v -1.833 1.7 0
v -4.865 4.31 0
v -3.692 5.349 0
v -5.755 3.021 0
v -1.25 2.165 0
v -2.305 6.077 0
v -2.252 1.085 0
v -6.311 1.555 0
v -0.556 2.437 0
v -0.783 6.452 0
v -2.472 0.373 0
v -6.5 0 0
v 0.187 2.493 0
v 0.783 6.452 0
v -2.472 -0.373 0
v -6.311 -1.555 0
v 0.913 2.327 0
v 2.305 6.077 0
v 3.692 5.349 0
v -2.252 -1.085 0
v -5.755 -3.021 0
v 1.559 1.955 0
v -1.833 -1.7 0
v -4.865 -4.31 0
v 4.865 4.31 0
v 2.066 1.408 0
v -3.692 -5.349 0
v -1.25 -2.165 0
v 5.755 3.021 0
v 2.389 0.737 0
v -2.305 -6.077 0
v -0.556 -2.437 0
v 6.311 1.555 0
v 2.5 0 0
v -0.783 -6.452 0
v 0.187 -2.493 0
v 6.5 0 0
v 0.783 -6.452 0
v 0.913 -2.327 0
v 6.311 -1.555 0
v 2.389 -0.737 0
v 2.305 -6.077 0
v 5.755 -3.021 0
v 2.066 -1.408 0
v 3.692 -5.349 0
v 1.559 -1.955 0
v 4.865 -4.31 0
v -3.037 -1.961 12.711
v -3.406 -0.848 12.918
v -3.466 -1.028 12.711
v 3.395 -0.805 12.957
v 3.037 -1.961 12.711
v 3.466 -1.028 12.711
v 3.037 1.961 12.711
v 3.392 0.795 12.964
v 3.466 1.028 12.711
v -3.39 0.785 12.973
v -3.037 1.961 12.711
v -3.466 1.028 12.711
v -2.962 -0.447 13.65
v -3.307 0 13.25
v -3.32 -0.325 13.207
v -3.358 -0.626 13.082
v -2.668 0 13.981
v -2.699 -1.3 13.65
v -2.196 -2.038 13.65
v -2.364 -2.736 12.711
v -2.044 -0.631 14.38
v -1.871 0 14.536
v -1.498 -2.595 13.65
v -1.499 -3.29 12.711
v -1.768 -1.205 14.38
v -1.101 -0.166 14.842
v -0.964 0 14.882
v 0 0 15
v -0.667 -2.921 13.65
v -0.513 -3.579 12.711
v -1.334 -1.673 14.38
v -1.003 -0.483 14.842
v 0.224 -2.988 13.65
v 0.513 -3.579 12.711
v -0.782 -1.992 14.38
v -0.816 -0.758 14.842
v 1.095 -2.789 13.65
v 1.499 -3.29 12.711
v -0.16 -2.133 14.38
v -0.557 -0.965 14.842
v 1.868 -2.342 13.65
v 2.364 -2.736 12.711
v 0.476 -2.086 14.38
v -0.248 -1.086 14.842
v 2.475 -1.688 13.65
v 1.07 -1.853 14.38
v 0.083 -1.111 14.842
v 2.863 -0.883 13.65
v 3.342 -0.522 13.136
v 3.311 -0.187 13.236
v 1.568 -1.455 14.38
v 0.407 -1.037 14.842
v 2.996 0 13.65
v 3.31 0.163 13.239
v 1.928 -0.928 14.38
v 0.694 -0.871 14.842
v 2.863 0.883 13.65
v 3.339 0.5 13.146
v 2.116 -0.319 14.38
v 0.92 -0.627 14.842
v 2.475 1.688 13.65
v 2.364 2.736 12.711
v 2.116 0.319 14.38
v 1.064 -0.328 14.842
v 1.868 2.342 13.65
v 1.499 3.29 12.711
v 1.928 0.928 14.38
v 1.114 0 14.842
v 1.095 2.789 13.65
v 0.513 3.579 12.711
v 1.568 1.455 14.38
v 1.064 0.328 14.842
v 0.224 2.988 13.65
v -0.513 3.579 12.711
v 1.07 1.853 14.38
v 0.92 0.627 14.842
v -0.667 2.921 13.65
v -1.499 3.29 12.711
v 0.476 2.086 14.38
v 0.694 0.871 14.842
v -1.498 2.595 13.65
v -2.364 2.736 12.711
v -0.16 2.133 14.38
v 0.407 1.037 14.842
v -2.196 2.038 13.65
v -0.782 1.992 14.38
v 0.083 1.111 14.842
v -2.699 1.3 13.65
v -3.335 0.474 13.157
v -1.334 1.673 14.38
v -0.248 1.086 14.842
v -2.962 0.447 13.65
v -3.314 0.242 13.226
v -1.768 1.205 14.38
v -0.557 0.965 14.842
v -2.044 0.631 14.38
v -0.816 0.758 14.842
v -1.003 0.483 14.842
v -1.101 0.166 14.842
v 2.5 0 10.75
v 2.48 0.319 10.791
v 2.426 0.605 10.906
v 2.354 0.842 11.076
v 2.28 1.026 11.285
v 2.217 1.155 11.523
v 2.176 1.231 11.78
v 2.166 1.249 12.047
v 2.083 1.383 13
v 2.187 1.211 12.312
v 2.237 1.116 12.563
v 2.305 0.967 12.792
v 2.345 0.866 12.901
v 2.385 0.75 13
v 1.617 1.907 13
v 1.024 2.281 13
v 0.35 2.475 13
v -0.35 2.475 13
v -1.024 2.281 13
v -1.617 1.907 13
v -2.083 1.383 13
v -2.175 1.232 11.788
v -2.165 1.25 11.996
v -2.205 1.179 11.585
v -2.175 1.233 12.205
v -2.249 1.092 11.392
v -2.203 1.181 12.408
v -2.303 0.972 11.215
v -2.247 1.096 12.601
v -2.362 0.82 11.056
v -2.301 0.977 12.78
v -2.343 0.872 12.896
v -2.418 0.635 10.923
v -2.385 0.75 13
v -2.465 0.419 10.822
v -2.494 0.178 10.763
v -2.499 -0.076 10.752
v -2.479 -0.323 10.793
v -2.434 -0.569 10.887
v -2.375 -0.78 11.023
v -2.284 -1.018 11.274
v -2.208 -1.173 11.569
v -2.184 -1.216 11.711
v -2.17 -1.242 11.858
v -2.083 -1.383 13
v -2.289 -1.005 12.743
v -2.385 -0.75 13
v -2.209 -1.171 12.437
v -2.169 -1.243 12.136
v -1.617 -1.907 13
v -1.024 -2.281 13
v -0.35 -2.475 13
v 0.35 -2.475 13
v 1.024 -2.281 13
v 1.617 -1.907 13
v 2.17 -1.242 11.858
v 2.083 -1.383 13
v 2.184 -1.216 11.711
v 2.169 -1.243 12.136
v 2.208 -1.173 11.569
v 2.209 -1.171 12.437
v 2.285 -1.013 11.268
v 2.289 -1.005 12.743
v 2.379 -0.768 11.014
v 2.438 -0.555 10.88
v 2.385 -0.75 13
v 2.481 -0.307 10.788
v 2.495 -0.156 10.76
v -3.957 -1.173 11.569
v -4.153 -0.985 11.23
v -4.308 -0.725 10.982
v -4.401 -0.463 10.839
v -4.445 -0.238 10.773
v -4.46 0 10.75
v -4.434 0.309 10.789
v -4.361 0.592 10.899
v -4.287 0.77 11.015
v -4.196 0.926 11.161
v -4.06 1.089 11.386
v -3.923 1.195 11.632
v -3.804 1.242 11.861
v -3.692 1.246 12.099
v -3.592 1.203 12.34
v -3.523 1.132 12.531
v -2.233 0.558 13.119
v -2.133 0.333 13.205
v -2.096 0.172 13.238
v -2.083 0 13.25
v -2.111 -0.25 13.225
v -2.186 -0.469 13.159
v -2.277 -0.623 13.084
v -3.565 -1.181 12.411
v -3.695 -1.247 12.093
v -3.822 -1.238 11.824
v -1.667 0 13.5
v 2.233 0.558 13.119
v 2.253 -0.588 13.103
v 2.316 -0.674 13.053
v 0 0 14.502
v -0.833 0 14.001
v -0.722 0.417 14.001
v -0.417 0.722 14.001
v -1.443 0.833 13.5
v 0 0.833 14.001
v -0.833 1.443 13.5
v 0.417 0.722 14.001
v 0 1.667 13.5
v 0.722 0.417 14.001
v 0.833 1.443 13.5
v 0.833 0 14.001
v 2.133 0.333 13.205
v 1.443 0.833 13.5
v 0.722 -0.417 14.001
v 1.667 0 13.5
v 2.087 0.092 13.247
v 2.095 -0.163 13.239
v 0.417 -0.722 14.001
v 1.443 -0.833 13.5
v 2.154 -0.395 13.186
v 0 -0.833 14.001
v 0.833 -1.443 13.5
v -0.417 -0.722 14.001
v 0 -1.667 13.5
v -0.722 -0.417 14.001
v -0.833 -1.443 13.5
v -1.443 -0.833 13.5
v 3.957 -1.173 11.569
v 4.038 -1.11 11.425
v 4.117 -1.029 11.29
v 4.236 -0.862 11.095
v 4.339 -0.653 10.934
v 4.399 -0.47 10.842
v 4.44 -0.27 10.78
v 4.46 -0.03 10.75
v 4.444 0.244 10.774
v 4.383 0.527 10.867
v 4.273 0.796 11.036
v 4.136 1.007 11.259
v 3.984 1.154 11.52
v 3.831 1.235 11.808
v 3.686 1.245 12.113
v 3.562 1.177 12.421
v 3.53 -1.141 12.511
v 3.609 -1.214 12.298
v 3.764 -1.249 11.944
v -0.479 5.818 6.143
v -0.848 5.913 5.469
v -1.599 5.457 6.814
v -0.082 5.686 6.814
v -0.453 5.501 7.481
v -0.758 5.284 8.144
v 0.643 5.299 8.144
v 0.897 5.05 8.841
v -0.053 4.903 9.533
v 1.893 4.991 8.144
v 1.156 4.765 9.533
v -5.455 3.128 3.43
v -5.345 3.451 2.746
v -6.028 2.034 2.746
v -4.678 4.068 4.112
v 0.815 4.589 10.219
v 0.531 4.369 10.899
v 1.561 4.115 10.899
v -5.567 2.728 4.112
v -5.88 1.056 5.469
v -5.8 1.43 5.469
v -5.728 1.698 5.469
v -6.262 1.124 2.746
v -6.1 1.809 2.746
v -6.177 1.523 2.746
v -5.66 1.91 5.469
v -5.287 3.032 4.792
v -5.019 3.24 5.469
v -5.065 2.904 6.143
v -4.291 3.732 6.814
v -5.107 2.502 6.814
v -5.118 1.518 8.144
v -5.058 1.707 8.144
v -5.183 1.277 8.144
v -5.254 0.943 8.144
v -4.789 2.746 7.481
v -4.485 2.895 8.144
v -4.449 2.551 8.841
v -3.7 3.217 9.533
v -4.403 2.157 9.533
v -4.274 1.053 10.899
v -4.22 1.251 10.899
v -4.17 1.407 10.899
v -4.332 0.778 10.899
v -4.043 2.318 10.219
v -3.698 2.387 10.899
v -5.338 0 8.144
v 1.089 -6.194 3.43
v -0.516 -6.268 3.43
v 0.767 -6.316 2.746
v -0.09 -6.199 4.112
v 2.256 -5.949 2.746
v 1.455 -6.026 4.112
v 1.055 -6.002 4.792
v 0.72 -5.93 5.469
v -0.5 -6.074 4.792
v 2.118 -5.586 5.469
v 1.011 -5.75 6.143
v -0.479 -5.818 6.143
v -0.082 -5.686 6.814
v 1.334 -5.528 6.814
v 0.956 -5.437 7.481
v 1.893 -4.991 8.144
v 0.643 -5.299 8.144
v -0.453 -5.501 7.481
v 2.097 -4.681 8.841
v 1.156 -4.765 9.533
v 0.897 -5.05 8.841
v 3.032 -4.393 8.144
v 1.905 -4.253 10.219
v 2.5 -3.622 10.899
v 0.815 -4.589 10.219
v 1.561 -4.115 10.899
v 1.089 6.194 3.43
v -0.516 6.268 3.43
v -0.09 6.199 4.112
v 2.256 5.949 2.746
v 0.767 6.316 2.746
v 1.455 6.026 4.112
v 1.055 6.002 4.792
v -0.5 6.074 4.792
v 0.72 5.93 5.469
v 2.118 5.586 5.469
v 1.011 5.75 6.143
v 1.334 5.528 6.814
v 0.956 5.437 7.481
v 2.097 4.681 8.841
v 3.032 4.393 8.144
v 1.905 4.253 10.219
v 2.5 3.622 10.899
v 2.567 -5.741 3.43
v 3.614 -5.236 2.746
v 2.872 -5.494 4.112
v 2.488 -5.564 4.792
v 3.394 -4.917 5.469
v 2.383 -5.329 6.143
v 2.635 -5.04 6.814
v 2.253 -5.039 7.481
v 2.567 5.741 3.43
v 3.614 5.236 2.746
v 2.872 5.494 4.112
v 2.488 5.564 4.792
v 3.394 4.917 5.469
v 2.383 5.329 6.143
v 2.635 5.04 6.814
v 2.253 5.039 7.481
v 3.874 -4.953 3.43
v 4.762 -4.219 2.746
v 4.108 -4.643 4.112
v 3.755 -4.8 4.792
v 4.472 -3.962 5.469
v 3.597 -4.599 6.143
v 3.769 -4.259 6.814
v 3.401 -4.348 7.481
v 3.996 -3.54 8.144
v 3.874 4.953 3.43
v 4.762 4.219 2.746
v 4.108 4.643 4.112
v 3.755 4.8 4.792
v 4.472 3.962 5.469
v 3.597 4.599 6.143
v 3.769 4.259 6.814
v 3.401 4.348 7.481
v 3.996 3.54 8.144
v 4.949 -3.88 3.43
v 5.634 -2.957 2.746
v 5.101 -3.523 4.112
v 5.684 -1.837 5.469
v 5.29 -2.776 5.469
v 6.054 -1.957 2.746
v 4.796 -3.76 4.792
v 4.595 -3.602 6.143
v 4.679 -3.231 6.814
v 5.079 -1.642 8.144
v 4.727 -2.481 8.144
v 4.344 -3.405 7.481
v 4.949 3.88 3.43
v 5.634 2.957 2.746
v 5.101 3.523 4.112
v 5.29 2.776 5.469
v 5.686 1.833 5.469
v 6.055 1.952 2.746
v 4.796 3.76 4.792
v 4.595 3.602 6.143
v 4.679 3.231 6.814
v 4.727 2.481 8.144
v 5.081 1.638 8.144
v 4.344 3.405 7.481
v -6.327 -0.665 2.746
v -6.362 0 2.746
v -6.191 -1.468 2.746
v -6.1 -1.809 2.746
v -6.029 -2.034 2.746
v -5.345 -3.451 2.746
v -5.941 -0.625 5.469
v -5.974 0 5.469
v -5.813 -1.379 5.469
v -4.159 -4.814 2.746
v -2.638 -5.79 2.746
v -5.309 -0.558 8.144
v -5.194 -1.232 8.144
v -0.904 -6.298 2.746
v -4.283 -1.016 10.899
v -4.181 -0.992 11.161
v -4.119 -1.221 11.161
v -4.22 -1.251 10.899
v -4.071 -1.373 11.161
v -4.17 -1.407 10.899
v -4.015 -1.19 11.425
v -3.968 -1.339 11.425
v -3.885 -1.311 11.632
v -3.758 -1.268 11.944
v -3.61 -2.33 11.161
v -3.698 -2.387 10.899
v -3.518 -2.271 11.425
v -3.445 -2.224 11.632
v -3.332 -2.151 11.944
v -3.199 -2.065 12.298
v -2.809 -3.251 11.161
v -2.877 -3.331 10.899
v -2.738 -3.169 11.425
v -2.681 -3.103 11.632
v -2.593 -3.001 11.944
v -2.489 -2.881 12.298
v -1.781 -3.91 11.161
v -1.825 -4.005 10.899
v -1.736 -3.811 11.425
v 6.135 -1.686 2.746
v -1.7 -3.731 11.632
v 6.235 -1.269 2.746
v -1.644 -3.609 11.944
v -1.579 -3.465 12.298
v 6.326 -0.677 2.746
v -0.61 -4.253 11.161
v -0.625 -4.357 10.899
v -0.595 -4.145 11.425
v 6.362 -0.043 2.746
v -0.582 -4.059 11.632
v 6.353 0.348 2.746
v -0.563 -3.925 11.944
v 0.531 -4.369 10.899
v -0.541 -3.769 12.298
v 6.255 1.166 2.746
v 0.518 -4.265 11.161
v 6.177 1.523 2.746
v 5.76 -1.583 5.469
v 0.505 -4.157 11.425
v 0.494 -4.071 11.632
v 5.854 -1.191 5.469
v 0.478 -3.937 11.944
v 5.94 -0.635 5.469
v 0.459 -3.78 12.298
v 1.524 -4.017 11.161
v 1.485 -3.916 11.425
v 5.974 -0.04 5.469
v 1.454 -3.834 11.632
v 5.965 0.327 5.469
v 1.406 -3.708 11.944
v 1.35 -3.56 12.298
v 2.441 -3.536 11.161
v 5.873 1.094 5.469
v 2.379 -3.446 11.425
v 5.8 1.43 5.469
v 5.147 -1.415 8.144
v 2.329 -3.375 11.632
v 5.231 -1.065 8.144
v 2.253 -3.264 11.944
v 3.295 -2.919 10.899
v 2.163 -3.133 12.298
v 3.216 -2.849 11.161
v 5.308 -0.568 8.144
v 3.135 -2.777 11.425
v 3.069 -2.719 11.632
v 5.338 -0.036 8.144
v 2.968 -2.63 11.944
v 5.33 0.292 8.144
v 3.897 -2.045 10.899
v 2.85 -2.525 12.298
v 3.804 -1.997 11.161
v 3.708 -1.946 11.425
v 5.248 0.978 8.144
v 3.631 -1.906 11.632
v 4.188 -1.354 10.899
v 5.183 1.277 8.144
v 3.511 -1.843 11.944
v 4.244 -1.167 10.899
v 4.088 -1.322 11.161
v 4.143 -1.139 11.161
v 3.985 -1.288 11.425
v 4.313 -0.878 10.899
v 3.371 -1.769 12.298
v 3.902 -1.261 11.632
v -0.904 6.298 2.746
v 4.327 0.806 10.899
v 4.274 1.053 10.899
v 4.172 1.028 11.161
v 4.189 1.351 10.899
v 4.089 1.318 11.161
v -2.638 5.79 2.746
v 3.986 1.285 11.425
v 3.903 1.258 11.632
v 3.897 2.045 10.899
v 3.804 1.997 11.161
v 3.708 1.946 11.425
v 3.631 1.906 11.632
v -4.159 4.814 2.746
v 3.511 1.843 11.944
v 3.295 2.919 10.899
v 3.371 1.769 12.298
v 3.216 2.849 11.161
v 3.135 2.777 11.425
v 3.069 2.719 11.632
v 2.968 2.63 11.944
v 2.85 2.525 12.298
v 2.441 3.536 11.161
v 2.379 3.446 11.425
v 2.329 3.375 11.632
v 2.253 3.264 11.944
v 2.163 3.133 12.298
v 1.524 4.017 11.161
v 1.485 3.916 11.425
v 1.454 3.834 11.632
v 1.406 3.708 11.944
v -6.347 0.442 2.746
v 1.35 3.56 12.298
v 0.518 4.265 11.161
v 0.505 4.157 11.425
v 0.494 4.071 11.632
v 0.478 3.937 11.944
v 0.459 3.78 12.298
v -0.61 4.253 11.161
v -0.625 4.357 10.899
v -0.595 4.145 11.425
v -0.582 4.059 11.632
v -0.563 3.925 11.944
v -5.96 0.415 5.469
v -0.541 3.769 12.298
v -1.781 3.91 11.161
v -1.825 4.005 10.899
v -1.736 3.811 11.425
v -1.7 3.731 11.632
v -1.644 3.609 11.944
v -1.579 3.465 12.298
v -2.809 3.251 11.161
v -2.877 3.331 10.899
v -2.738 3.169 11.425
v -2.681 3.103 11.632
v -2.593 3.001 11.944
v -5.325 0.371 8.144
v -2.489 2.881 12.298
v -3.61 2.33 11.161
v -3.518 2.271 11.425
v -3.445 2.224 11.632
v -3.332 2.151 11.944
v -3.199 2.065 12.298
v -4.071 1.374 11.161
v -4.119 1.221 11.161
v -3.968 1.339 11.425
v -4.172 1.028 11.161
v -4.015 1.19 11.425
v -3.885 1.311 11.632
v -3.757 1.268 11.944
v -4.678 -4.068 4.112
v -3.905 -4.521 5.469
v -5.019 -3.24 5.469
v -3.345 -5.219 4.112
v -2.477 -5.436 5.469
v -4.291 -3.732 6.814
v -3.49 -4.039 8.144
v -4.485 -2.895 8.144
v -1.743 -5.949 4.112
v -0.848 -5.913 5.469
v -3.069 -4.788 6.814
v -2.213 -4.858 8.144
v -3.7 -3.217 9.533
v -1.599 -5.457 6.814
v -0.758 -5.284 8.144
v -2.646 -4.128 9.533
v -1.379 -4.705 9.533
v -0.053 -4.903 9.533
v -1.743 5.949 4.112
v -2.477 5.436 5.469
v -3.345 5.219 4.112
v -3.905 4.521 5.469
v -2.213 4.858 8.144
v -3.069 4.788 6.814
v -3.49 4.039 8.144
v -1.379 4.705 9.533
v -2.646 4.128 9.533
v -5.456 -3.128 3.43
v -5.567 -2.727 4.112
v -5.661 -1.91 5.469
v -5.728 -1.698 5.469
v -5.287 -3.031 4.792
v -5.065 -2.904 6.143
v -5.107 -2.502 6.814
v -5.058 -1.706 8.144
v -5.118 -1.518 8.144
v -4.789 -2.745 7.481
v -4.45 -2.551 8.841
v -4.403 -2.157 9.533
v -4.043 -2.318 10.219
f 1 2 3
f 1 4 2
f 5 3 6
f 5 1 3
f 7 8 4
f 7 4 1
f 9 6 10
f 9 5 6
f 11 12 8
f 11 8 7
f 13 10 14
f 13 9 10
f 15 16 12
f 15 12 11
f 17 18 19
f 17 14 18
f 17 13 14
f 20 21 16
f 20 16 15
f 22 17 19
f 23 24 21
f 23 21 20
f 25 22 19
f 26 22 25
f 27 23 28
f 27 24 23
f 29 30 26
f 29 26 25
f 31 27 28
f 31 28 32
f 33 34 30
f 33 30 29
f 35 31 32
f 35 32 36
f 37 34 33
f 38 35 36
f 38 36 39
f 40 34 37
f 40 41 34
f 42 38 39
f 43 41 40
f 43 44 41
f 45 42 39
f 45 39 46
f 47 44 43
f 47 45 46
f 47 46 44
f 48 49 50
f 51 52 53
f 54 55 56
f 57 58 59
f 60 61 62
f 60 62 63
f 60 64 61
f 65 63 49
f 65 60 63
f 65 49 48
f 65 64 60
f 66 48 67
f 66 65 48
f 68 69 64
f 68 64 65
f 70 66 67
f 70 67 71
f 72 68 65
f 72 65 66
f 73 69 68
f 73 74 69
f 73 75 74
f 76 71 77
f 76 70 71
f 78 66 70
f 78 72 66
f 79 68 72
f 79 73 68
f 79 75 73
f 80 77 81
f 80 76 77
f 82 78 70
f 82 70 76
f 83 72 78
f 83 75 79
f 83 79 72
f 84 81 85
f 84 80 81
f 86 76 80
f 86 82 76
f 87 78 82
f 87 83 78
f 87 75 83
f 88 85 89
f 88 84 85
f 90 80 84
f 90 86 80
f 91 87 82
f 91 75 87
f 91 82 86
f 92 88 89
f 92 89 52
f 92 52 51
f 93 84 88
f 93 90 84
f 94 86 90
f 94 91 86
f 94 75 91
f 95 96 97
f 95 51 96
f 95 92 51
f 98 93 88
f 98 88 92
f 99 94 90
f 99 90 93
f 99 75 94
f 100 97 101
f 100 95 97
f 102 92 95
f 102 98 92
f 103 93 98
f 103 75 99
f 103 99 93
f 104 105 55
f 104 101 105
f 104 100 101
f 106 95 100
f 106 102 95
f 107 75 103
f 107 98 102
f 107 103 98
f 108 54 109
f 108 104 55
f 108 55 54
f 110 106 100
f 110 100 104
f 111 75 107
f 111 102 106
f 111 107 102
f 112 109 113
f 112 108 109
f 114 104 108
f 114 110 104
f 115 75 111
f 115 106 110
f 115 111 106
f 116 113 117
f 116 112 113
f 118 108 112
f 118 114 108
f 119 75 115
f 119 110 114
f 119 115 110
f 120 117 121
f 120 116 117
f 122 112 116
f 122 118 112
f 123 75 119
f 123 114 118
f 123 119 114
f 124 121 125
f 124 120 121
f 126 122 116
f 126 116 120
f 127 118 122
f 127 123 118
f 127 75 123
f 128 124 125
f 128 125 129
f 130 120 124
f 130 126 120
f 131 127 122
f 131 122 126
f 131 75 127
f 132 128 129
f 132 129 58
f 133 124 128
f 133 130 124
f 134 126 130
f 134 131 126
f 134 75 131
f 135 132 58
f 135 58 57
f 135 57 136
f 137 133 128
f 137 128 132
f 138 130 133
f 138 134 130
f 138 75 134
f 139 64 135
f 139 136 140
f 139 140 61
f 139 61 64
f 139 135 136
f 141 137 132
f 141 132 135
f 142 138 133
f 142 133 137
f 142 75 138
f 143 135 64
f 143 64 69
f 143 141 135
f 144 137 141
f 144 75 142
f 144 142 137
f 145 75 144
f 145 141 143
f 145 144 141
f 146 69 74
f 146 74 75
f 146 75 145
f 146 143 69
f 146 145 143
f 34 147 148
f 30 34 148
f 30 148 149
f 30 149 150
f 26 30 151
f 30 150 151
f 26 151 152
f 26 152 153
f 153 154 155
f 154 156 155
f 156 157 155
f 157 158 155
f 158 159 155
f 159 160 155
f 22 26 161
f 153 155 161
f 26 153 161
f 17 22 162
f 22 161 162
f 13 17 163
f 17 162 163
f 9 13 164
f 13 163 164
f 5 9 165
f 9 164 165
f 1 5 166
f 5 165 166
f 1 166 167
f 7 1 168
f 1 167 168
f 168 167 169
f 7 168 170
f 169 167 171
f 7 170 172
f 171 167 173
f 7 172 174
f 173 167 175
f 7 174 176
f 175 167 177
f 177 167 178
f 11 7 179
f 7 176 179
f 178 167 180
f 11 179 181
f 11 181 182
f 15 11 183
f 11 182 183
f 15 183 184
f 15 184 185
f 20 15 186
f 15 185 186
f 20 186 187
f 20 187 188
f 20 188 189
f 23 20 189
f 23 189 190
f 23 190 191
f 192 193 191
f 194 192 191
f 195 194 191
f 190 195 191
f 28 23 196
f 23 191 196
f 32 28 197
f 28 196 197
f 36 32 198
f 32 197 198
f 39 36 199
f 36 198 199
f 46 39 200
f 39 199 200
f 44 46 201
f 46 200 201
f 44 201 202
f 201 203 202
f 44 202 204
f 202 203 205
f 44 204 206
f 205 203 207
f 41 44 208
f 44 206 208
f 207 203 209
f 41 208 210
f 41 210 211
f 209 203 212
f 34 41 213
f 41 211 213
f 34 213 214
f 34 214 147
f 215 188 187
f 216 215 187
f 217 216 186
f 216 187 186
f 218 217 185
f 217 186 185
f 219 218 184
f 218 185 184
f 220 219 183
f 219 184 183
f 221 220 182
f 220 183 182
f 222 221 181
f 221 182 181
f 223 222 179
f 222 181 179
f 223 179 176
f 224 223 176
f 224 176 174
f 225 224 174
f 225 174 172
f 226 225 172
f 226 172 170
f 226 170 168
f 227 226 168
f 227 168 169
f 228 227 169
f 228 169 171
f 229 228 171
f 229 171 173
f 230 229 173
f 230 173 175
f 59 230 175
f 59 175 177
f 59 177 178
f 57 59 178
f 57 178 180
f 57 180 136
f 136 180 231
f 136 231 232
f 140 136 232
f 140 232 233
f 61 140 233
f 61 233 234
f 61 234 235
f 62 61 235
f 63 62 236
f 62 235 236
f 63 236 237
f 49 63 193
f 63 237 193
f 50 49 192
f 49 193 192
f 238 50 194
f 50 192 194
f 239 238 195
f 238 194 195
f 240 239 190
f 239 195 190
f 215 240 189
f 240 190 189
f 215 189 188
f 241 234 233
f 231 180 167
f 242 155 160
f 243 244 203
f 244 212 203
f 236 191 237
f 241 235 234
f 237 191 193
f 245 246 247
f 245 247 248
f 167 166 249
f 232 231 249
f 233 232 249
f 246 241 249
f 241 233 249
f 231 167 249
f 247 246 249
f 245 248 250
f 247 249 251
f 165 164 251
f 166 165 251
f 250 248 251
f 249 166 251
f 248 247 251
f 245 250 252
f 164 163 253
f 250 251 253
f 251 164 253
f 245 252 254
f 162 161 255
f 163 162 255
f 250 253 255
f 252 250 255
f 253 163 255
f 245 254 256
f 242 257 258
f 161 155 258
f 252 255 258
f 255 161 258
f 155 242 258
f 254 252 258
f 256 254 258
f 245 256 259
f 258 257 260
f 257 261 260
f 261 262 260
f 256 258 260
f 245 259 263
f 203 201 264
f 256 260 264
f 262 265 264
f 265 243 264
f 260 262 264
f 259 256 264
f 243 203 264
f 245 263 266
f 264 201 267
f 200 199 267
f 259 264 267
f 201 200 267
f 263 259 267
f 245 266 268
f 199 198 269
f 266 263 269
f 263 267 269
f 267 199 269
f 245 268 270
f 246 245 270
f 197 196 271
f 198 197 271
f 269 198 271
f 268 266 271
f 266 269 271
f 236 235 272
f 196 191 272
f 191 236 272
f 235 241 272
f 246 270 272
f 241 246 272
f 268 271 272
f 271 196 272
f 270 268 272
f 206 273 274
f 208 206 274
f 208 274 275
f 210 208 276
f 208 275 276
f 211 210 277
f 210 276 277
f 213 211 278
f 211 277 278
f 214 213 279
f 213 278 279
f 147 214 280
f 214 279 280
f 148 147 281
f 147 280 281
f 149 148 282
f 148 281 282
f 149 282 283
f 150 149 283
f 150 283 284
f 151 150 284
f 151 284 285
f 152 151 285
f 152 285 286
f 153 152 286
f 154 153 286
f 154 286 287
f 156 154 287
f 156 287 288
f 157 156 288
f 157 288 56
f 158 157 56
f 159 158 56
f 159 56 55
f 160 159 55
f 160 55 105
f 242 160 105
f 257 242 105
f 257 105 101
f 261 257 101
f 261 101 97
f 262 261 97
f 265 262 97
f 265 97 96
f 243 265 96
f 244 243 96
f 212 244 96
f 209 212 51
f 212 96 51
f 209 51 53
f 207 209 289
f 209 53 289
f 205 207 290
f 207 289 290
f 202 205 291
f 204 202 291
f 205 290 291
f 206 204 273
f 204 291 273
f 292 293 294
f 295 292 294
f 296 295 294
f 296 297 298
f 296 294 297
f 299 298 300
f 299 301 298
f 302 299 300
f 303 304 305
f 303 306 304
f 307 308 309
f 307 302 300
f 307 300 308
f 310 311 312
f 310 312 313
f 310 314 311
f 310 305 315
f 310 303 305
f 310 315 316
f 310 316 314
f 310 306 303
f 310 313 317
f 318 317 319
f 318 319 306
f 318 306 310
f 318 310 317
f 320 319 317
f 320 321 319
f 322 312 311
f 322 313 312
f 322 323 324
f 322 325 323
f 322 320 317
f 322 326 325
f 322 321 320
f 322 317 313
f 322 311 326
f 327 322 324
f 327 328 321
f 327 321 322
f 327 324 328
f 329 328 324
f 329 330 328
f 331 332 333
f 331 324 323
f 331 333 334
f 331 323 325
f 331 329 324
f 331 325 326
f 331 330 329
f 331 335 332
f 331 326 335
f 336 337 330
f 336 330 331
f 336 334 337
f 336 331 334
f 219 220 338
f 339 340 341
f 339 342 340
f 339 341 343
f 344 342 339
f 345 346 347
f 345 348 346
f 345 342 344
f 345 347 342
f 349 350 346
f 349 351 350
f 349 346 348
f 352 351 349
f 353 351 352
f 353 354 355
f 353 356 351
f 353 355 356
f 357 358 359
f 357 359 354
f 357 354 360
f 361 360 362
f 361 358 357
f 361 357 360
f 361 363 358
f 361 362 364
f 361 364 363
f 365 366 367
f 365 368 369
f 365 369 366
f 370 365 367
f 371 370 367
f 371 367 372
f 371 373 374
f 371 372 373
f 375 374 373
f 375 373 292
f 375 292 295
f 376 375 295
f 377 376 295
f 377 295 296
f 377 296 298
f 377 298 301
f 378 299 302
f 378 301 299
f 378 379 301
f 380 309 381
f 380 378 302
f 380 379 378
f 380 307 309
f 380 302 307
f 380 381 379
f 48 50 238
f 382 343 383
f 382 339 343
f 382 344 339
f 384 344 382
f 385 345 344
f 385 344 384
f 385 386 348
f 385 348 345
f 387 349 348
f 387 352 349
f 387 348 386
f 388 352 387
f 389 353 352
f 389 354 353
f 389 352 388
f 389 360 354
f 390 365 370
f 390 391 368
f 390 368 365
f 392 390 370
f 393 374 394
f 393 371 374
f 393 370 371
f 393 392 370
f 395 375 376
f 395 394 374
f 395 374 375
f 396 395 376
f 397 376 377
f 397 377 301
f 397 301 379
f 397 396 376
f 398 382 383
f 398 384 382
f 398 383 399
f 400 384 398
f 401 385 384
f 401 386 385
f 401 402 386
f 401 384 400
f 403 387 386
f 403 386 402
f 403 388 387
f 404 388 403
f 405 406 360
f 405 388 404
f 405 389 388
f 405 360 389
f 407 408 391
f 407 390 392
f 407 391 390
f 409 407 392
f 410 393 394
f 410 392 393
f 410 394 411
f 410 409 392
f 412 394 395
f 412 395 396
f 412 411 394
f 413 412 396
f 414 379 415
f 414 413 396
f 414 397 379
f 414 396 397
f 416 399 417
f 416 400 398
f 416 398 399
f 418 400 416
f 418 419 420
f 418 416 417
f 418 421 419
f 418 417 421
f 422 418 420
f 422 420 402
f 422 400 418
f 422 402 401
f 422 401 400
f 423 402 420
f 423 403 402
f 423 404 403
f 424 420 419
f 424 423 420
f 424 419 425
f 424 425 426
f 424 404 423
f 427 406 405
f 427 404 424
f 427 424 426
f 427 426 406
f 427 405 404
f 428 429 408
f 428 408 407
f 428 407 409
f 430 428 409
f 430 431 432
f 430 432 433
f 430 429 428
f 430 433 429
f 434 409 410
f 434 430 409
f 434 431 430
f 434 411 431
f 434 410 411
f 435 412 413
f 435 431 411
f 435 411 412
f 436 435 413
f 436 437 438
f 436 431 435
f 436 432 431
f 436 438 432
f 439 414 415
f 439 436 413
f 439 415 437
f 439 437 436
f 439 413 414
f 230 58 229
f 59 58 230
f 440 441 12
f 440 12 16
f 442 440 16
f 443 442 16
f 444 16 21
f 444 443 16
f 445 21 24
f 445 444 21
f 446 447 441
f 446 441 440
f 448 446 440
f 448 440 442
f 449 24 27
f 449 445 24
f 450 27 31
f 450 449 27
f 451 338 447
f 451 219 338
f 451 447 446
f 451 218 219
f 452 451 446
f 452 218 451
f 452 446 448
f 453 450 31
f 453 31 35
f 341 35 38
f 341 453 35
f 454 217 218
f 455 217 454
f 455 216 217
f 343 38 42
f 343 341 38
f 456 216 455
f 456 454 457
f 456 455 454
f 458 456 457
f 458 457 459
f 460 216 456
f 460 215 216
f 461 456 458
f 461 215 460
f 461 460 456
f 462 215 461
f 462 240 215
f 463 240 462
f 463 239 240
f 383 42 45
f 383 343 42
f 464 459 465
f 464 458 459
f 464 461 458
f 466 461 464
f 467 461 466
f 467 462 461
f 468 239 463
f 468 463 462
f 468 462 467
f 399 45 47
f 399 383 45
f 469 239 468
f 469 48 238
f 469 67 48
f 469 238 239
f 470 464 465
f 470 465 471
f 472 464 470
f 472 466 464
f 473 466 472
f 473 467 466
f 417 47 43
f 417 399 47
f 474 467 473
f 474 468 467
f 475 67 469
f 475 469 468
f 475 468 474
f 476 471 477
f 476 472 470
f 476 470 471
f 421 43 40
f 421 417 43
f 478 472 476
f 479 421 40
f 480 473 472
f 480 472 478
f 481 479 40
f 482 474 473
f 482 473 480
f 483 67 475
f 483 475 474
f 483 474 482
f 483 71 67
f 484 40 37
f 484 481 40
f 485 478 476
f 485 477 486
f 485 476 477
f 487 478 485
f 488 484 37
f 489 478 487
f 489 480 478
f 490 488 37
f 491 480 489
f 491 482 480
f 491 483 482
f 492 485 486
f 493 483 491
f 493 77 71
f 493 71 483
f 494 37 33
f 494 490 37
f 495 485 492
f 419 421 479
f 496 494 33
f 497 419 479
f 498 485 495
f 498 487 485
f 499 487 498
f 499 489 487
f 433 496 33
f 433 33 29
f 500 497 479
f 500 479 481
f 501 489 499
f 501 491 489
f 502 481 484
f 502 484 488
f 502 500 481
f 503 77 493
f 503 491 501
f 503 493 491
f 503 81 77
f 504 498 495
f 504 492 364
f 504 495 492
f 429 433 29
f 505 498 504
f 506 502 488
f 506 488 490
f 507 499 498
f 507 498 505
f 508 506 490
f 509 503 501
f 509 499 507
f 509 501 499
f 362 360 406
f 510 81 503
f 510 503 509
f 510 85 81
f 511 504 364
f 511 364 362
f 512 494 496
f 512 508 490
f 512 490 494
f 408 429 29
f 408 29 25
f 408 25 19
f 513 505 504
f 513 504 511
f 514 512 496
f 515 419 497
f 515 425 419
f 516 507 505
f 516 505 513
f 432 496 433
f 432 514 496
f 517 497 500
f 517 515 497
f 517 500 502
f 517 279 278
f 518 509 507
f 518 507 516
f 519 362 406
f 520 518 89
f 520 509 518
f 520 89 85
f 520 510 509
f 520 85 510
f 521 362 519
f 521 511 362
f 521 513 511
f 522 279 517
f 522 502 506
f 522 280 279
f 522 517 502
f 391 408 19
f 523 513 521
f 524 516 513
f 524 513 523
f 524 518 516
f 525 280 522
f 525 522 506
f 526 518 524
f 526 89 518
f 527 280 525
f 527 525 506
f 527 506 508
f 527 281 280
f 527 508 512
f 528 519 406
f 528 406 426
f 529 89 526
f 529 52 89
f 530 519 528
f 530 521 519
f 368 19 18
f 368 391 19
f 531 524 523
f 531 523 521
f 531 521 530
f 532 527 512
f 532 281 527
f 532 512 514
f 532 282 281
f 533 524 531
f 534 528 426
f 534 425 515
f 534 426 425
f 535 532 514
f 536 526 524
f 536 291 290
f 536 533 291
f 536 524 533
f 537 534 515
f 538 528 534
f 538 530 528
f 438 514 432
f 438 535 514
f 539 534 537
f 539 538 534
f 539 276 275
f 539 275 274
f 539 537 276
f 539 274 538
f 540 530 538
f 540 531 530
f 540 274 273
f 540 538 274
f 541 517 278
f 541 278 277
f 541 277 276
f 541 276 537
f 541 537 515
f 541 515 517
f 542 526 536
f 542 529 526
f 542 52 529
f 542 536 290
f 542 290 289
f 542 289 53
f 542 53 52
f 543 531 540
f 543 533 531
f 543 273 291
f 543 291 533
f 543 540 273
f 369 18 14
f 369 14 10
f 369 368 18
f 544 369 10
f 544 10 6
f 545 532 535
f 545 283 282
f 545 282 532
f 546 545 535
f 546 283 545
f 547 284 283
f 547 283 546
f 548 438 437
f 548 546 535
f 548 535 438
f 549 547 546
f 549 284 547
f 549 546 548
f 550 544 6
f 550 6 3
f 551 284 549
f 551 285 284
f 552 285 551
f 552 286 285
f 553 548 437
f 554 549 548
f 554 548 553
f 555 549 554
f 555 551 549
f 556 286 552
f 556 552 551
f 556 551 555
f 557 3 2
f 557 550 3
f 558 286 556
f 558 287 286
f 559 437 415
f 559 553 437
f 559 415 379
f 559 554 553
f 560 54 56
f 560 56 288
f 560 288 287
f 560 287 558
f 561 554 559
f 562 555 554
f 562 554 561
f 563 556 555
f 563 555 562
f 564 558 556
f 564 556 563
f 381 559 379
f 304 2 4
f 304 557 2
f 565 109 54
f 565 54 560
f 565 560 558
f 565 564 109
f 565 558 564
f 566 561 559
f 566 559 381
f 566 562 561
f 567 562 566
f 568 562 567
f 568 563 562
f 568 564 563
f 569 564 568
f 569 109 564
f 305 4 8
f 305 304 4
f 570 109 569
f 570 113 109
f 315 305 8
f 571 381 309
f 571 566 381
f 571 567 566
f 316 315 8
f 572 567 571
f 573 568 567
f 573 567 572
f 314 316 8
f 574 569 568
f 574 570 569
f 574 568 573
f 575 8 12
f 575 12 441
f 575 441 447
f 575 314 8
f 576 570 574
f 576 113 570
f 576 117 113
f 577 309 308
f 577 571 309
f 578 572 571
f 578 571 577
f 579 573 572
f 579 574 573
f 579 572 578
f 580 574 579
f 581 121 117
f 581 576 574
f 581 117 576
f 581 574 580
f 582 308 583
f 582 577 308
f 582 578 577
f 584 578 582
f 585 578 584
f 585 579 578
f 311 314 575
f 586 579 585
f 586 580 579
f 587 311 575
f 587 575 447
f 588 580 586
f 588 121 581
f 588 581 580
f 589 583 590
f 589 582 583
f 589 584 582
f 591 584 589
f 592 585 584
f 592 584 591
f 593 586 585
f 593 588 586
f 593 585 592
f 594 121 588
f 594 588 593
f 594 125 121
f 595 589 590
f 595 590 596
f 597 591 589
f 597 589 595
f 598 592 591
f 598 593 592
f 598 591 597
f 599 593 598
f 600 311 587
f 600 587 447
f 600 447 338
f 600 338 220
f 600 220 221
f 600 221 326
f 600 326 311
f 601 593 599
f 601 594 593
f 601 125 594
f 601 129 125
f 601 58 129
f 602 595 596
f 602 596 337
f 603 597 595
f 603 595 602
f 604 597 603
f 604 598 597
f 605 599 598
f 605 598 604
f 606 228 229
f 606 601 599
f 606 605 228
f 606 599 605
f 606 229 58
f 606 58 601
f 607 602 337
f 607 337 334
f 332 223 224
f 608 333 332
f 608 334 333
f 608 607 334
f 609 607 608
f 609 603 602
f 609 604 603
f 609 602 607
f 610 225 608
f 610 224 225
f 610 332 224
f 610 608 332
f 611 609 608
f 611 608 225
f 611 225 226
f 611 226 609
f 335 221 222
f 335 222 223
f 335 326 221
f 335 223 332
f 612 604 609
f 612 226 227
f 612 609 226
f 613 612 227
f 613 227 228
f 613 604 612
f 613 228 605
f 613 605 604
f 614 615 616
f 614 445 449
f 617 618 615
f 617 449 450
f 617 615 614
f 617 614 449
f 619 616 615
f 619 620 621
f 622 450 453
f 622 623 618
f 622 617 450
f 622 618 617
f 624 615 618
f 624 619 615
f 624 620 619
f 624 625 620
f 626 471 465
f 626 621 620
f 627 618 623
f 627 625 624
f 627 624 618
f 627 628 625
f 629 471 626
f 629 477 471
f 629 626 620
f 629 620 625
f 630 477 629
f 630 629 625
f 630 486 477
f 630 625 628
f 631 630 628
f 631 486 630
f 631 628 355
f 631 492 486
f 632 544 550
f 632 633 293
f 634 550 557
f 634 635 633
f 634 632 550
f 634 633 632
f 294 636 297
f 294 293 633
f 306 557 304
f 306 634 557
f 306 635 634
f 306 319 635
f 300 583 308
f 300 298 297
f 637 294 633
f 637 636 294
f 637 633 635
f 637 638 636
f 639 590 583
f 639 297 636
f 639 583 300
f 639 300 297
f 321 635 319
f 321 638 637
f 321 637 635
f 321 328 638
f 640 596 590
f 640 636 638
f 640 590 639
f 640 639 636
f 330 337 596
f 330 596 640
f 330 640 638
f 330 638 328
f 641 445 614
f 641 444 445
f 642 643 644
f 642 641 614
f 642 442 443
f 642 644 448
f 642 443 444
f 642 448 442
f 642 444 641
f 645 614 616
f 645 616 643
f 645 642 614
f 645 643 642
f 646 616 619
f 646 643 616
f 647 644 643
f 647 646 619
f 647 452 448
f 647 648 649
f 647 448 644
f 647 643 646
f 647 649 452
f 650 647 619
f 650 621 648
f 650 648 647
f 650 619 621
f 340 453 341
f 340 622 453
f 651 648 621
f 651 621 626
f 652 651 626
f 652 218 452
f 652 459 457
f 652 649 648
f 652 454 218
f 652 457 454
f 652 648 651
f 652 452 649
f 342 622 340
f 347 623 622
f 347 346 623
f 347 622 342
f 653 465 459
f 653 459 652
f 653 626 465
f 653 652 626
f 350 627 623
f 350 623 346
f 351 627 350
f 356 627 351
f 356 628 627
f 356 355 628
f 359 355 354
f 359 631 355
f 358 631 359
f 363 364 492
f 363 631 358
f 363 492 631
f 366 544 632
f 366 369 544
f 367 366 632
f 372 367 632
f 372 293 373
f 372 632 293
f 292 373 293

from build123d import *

# Parameters (mm, degrees)
M6X1_0_TAPPED_HOLE1_D     = 5
M6X1_0_TAPPED_HOLE1_DEPTH = 12.99972
M6X1_0_TAPPED_HOLE1_TIP   = 1.502151548
SKETCH4_R                 = 1.25
CUT_EXTRUDE1_DEPTH        = 12.7


with BuildPart() as part:
    # Sketch1 → Revolve1 (revolve)
    with BuildSketch(Plane(origin=(0, 0, 0), x_dir=(0, 0, -1), z_dir=(1, 0, 0)), mode=Mode.PRIVATE) as revolve1_sk:
        with BuildLine():
            Line((-15, 0), (0, 0))
            Line((0, 0), (0, 6.4997425))
            ThreePointArc((0, 6.4997425), (-6.51425993, 5.756273724), (-12.71143042, 3.615384615))
            ThreePointArc((-12.71143042, 3.615384615), (-14.379772306, 2.13942496), (-15, 0))
        make_face()
    revolve(revolve1_sk.sketch.rotate(Axis((0, 0, 0), (0, 0, 1)), 90), axis=Axis((0, 0, 0), (0, 0, 1)))

    # M6x1.0 Tapped Hole1
    with Locations(Plane(origin=(0, 0, 0), x_dir=(-1, 0, 0), z_dir=(0, 0, -1))):
        with Locations((0, 0)):
            Hole(M6X1_0_TAPPED_HOLE1_D / 2, depth=M6X1_0_TAPPED_HOLE1_DEPTH)
            with Locations((0, 0, -(M6X1_0_TAPPED_HOLE1_DEPTH + M6X1_0_TAPPED_HOLE1_TIP / 2))):  # 118° drill point
                Cone(0, M6X1_0_TAPPED_HOLE1_D / 2, M6X1_0_TAPPED_HOLE1_TIP, mode=Mode.SUBTRACT)

    # Sketch4 → Cut-Extrude1 (cut, symmetric)
    with BuildSketch(Plane(origin=(0, 0, 0), x_dir=(0, 0, -1), z_dir=(1, 0, 0))):
        with Locations(Location((-12, 0, 0), (0, 0, 290.171984379))):
            Circle(SKETCH4_R)
    extrude(amount=CUT_EXTRUDE1_DEPTH, both=True, mode=Mode.SUBTRACT)


solid = part.part
